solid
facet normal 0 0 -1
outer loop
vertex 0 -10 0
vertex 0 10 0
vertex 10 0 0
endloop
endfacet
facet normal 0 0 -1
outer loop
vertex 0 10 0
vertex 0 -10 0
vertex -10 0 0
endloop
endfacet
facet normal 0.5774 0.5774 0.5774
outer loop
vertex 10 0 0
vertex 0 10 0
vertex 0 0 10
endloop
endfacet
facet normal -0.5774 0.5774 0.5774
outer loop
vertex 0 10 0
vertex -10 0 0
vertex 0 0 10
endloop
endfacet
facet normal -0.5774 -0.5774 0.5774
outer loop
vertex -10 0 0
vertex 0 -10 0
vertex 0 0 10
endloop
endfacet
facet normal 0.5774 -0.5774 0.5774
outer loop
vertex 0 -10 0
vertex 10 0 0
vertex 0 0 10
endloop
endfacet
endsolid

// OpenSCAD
// Volume: 666.6666666666666, SurfaceArea: 546.4101615137754
echo(version=version());

polyhedron(
  points = [
    [10, 0, 0],
    [0, 10, 0],
    [-10, 0, 0],
    [0, -10, 0],
    [0, 0, 10]
  ],
  triangles = [
    [0, 1, 2, 3],
    [4, 1, 0],
    [4, 2, 1],
    [4, 3, 2],
    [4, 0, 3]
  ]
);

// Written by Clifford Wolf <clifford@clifford.at> and Marius
// Kintel <marius@kintel.net>
//
// To the extent possible under law, the author(s) have dedicated all
// copyright and related and neighboring rights to this software to the
// public domain worldwide. This software is distributed without any
// warranty.
//
// You should have received a copy of the CC0 Public Domain
// Dedication along with this software.
// If not, see <http://creativecommons.org/publicdomain/zero/1.0/>.
